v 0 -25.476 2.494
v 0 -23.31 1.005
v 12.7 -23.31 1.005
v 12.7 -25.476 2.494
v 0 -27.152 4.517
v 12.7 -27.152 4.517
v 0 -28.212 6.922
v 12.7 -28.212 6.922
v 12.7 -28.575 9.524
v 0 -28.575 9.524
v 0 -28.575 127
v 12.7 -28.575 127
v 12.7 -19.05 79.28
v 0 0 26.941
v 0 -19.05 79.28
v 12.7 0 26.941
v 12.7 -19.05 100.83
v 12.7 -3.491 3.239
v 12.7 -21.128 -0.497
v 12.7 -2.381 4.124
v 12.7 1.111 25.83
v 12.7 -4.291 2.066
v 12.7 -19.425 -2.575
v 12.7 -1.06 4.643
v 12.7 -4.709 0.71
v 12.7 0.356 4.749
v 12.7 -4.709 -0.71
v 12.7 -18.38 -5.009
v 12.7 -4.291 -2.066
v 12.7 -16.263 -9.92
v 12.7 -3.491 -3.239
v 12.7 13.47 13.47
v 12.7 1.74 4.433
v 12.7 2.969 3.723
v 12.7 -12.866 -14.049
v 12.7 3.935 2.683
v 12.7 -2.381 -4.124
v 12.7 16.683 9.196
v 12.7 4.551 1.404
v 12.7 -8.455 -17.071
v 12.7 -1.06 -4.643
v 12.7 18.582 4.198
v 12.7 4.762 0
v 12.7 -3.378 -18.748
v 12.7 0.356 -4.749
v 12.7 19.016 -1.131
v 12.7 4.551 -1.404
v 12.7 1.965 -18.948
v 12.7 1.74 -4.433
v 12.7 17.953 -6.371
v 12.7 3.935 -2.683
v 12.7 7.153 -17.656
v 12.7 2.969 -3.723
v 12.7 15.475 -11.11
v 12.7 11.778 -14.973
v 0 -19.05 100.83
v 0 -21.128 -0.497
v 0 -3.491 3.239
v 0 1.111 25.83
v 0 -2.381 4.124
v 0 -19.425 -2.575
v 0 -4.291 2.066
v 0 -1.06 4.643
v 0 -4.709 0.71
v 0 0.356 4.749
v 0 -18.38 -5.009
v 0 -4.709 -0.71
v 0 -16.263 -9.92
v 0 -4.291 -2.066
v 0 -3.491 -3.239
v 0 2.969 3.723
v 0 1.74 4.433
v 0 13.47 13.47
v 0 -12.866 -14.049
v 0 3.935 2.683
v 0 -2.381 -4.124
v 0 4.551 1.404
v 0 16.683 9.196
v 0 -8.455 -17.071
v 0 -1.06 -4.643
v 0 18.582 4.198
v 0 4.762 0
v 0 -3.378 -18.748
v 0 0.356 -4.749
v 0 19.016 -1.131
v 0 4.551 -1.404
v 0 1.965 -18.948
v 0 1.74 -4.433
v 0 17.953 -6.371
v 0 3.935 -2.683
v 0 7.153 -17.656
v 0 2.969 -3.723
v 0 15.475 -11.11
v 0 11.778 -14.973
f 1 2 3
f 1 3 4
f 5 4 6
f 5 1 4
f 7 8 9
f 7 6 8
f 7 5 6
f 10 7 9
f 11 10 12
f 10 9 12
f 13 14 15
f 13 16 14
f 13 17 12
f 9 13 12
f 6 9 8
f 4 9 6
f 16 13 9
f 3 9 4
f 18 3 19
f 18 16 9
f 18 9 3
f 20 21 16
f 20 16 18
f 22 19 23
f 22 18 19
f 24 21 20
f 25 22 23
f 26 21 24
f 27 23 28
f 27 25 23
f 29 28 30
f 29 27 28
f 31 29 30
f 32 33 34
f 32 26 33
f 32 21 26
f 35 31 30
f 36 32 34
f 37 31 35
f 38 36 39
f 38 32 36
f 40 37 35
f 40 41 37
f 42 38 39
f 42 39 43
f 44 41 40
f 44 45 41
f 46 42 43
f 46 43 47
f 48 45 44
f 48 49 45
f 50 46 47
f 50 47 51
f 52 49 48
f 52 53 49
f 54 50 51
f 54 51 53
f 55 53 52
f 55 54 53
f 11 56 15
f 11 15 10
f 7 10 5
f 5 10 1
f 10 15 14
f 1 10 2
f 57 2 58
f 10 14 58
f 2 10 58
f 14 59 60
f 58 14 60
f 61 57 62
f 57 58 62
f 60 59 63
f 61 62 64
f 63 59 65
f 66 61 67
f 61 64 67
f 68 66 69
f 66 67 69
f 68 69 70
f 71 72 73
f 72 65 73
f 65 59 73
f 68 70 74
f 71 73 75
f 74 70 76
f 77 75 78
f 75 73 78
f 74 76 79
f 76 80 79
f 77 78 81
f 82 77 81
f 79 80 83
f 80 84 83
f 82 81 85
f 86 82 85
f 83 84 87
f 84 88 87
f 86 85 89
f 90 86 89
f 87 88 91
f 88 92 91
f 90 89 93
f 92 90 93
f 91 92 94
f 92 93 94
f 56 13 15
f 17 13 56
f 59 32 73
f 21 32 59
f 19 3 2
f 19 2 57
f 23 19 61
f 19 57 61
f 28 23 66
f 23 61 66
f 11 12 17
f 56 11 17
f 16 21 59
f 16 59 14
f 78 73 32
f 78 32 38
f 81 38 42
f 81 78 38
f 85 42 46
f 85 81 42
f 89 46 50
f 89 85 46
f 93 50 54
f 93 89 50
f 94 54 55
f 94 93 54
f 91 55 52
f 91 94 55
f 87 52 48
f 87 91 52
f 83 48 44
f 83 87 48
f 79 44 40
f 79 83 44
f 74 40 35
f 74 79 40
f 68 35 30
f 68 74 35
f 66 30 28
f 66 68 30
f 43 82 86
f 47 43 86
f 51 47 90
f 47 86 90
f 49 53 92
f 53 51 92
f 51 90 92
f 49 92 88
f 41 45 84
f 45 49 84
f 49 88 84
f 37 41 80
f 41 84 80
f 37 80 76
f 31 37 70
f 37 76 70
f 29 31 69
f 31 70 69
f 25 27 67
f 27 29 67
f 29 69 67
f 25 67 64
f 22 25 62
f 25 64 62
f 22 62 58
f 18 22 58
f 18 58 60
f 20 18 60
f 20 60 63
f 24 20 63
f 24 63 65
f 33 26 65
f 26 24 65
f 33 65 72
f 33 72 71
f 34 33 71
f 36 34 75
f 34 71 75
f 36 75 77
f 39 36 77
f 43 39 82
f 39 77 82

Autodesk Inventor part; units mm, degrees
ref_plane "YZ Plane" through (0, 0, 0) normal (1, 0, 0) x (0, 1, 0)
ref_plane "XZ Plane" through (0, 0, 0) normal (0, 1, 0) x (-1, 0, 0)
ref_plane "XY Plane" through (0, 0, 0) normal (0, 0, 1) x (1, 0, 0)
sketch "Sketch1" plane through (0, 0, 0) normal (1, 0, 0) x (0, 1, 0)
  circle A0 centre (0, 0) radius 4.7625
  circle A1 centre (0, 0) radius 19.05
  dimension "d0" = 9.525
  dimension "d1" = 38.1
extrude "Extrusion1" add sketch "Sketch1" along normal blind 12.7
sketch "Sketch2" plane through (12.7, 0, 0) normal (1, 0, 0) x (0, 0, -1)
  circle A0 centre (0, 0) radius 19.05 projected
  line L0 (0, -19.05) -> (-50.8, -19.05)
  circle A1 centre (0, 0) radius 4.7625 projected
  line L1 (0, -19.05) -> (11.4002, -19.05)
  line L2 (-13.4704, 13.4704) -> (-25.8301, 1.1106)
  line L3 (0, 0) -> (-13.4704, 13.4704)
  line L4 (0, 0) -> (-19.05, 0)
  line L5 (-25.8301, 1.1106) -> (-26.9408, 0)
  line L6 (0, -19.05) -> (-127, -19.05)
  line L7 (0, -38.1) -> (0, -19.05)
  line L8 (-26.9408, 0) -> (-59.9363, -19.05)
  line L9 (0, -28.575) -> (-127, -28.575)
  line L10 (-127, -28.575) -> (-100.8303, -19.05)
  line L11 (-79.2802, -19.05) -> (16.9609, 15.9789)
  dimension "d6" = 50.8
  dimension "d7" = 0
  dimension "d8" = 180
  dimension "d9" = 45
  dimension "d10" = 45
  dimension "d11" = 17.4793
  dimension "d13" = 19.05
  dimension "d17" = 30
  dimension "d18" = 180
  dimension "d19" = 38.1
  dimension "d20" = 127
  dimension "d21" = 20
  dimension "d24" = 20
  dimension "d25" = 0
extrude "Extrusion2" add sketch "Sketch2" against normal blind 12.7 contours A0 L0 L6 L8 L11 | L7 L9 L10 L6 L0 | L11 L5 L2 A0
sketch "Sketch3" plane through (12.7, 0, 0) normal (1, 0, 0) x (0, 0, -1)
  line L0 (-59.9363, -19.05) -> (-26.9408, 0) projected
  line L1 (-26.9408, 0) -> (-79.2802, -19.05)
  line L2 (-100.8303, -19.05) -> (-59.9363, -19.05) projected
  line L3 (-79.2802, -19.05) -> (-59.9363, -19.05)
  line L4 (-26.9408, 0) -> (-59.9363, -19.05)
  point P0 (0, 0)
  dimension "d26" = 20
extrude "Extrusion3" add sketch "Sketch3" against normal blind 12.7
fillet "Fillet1" radius 9.525 1 edges at (6.35, -28.575, 0)
fillet "Fillet2" radius 9.525 2 edges at (6.35, -19.0505, 0) (6.35, -19.05, 0)
sketch "Sketch4" plane through (12.7, 0, 0) normal (1, 0, 0) x (0, 0, -1)
  point P0 (0, 0)
properties part number "Wedgelet" material "Steel"
